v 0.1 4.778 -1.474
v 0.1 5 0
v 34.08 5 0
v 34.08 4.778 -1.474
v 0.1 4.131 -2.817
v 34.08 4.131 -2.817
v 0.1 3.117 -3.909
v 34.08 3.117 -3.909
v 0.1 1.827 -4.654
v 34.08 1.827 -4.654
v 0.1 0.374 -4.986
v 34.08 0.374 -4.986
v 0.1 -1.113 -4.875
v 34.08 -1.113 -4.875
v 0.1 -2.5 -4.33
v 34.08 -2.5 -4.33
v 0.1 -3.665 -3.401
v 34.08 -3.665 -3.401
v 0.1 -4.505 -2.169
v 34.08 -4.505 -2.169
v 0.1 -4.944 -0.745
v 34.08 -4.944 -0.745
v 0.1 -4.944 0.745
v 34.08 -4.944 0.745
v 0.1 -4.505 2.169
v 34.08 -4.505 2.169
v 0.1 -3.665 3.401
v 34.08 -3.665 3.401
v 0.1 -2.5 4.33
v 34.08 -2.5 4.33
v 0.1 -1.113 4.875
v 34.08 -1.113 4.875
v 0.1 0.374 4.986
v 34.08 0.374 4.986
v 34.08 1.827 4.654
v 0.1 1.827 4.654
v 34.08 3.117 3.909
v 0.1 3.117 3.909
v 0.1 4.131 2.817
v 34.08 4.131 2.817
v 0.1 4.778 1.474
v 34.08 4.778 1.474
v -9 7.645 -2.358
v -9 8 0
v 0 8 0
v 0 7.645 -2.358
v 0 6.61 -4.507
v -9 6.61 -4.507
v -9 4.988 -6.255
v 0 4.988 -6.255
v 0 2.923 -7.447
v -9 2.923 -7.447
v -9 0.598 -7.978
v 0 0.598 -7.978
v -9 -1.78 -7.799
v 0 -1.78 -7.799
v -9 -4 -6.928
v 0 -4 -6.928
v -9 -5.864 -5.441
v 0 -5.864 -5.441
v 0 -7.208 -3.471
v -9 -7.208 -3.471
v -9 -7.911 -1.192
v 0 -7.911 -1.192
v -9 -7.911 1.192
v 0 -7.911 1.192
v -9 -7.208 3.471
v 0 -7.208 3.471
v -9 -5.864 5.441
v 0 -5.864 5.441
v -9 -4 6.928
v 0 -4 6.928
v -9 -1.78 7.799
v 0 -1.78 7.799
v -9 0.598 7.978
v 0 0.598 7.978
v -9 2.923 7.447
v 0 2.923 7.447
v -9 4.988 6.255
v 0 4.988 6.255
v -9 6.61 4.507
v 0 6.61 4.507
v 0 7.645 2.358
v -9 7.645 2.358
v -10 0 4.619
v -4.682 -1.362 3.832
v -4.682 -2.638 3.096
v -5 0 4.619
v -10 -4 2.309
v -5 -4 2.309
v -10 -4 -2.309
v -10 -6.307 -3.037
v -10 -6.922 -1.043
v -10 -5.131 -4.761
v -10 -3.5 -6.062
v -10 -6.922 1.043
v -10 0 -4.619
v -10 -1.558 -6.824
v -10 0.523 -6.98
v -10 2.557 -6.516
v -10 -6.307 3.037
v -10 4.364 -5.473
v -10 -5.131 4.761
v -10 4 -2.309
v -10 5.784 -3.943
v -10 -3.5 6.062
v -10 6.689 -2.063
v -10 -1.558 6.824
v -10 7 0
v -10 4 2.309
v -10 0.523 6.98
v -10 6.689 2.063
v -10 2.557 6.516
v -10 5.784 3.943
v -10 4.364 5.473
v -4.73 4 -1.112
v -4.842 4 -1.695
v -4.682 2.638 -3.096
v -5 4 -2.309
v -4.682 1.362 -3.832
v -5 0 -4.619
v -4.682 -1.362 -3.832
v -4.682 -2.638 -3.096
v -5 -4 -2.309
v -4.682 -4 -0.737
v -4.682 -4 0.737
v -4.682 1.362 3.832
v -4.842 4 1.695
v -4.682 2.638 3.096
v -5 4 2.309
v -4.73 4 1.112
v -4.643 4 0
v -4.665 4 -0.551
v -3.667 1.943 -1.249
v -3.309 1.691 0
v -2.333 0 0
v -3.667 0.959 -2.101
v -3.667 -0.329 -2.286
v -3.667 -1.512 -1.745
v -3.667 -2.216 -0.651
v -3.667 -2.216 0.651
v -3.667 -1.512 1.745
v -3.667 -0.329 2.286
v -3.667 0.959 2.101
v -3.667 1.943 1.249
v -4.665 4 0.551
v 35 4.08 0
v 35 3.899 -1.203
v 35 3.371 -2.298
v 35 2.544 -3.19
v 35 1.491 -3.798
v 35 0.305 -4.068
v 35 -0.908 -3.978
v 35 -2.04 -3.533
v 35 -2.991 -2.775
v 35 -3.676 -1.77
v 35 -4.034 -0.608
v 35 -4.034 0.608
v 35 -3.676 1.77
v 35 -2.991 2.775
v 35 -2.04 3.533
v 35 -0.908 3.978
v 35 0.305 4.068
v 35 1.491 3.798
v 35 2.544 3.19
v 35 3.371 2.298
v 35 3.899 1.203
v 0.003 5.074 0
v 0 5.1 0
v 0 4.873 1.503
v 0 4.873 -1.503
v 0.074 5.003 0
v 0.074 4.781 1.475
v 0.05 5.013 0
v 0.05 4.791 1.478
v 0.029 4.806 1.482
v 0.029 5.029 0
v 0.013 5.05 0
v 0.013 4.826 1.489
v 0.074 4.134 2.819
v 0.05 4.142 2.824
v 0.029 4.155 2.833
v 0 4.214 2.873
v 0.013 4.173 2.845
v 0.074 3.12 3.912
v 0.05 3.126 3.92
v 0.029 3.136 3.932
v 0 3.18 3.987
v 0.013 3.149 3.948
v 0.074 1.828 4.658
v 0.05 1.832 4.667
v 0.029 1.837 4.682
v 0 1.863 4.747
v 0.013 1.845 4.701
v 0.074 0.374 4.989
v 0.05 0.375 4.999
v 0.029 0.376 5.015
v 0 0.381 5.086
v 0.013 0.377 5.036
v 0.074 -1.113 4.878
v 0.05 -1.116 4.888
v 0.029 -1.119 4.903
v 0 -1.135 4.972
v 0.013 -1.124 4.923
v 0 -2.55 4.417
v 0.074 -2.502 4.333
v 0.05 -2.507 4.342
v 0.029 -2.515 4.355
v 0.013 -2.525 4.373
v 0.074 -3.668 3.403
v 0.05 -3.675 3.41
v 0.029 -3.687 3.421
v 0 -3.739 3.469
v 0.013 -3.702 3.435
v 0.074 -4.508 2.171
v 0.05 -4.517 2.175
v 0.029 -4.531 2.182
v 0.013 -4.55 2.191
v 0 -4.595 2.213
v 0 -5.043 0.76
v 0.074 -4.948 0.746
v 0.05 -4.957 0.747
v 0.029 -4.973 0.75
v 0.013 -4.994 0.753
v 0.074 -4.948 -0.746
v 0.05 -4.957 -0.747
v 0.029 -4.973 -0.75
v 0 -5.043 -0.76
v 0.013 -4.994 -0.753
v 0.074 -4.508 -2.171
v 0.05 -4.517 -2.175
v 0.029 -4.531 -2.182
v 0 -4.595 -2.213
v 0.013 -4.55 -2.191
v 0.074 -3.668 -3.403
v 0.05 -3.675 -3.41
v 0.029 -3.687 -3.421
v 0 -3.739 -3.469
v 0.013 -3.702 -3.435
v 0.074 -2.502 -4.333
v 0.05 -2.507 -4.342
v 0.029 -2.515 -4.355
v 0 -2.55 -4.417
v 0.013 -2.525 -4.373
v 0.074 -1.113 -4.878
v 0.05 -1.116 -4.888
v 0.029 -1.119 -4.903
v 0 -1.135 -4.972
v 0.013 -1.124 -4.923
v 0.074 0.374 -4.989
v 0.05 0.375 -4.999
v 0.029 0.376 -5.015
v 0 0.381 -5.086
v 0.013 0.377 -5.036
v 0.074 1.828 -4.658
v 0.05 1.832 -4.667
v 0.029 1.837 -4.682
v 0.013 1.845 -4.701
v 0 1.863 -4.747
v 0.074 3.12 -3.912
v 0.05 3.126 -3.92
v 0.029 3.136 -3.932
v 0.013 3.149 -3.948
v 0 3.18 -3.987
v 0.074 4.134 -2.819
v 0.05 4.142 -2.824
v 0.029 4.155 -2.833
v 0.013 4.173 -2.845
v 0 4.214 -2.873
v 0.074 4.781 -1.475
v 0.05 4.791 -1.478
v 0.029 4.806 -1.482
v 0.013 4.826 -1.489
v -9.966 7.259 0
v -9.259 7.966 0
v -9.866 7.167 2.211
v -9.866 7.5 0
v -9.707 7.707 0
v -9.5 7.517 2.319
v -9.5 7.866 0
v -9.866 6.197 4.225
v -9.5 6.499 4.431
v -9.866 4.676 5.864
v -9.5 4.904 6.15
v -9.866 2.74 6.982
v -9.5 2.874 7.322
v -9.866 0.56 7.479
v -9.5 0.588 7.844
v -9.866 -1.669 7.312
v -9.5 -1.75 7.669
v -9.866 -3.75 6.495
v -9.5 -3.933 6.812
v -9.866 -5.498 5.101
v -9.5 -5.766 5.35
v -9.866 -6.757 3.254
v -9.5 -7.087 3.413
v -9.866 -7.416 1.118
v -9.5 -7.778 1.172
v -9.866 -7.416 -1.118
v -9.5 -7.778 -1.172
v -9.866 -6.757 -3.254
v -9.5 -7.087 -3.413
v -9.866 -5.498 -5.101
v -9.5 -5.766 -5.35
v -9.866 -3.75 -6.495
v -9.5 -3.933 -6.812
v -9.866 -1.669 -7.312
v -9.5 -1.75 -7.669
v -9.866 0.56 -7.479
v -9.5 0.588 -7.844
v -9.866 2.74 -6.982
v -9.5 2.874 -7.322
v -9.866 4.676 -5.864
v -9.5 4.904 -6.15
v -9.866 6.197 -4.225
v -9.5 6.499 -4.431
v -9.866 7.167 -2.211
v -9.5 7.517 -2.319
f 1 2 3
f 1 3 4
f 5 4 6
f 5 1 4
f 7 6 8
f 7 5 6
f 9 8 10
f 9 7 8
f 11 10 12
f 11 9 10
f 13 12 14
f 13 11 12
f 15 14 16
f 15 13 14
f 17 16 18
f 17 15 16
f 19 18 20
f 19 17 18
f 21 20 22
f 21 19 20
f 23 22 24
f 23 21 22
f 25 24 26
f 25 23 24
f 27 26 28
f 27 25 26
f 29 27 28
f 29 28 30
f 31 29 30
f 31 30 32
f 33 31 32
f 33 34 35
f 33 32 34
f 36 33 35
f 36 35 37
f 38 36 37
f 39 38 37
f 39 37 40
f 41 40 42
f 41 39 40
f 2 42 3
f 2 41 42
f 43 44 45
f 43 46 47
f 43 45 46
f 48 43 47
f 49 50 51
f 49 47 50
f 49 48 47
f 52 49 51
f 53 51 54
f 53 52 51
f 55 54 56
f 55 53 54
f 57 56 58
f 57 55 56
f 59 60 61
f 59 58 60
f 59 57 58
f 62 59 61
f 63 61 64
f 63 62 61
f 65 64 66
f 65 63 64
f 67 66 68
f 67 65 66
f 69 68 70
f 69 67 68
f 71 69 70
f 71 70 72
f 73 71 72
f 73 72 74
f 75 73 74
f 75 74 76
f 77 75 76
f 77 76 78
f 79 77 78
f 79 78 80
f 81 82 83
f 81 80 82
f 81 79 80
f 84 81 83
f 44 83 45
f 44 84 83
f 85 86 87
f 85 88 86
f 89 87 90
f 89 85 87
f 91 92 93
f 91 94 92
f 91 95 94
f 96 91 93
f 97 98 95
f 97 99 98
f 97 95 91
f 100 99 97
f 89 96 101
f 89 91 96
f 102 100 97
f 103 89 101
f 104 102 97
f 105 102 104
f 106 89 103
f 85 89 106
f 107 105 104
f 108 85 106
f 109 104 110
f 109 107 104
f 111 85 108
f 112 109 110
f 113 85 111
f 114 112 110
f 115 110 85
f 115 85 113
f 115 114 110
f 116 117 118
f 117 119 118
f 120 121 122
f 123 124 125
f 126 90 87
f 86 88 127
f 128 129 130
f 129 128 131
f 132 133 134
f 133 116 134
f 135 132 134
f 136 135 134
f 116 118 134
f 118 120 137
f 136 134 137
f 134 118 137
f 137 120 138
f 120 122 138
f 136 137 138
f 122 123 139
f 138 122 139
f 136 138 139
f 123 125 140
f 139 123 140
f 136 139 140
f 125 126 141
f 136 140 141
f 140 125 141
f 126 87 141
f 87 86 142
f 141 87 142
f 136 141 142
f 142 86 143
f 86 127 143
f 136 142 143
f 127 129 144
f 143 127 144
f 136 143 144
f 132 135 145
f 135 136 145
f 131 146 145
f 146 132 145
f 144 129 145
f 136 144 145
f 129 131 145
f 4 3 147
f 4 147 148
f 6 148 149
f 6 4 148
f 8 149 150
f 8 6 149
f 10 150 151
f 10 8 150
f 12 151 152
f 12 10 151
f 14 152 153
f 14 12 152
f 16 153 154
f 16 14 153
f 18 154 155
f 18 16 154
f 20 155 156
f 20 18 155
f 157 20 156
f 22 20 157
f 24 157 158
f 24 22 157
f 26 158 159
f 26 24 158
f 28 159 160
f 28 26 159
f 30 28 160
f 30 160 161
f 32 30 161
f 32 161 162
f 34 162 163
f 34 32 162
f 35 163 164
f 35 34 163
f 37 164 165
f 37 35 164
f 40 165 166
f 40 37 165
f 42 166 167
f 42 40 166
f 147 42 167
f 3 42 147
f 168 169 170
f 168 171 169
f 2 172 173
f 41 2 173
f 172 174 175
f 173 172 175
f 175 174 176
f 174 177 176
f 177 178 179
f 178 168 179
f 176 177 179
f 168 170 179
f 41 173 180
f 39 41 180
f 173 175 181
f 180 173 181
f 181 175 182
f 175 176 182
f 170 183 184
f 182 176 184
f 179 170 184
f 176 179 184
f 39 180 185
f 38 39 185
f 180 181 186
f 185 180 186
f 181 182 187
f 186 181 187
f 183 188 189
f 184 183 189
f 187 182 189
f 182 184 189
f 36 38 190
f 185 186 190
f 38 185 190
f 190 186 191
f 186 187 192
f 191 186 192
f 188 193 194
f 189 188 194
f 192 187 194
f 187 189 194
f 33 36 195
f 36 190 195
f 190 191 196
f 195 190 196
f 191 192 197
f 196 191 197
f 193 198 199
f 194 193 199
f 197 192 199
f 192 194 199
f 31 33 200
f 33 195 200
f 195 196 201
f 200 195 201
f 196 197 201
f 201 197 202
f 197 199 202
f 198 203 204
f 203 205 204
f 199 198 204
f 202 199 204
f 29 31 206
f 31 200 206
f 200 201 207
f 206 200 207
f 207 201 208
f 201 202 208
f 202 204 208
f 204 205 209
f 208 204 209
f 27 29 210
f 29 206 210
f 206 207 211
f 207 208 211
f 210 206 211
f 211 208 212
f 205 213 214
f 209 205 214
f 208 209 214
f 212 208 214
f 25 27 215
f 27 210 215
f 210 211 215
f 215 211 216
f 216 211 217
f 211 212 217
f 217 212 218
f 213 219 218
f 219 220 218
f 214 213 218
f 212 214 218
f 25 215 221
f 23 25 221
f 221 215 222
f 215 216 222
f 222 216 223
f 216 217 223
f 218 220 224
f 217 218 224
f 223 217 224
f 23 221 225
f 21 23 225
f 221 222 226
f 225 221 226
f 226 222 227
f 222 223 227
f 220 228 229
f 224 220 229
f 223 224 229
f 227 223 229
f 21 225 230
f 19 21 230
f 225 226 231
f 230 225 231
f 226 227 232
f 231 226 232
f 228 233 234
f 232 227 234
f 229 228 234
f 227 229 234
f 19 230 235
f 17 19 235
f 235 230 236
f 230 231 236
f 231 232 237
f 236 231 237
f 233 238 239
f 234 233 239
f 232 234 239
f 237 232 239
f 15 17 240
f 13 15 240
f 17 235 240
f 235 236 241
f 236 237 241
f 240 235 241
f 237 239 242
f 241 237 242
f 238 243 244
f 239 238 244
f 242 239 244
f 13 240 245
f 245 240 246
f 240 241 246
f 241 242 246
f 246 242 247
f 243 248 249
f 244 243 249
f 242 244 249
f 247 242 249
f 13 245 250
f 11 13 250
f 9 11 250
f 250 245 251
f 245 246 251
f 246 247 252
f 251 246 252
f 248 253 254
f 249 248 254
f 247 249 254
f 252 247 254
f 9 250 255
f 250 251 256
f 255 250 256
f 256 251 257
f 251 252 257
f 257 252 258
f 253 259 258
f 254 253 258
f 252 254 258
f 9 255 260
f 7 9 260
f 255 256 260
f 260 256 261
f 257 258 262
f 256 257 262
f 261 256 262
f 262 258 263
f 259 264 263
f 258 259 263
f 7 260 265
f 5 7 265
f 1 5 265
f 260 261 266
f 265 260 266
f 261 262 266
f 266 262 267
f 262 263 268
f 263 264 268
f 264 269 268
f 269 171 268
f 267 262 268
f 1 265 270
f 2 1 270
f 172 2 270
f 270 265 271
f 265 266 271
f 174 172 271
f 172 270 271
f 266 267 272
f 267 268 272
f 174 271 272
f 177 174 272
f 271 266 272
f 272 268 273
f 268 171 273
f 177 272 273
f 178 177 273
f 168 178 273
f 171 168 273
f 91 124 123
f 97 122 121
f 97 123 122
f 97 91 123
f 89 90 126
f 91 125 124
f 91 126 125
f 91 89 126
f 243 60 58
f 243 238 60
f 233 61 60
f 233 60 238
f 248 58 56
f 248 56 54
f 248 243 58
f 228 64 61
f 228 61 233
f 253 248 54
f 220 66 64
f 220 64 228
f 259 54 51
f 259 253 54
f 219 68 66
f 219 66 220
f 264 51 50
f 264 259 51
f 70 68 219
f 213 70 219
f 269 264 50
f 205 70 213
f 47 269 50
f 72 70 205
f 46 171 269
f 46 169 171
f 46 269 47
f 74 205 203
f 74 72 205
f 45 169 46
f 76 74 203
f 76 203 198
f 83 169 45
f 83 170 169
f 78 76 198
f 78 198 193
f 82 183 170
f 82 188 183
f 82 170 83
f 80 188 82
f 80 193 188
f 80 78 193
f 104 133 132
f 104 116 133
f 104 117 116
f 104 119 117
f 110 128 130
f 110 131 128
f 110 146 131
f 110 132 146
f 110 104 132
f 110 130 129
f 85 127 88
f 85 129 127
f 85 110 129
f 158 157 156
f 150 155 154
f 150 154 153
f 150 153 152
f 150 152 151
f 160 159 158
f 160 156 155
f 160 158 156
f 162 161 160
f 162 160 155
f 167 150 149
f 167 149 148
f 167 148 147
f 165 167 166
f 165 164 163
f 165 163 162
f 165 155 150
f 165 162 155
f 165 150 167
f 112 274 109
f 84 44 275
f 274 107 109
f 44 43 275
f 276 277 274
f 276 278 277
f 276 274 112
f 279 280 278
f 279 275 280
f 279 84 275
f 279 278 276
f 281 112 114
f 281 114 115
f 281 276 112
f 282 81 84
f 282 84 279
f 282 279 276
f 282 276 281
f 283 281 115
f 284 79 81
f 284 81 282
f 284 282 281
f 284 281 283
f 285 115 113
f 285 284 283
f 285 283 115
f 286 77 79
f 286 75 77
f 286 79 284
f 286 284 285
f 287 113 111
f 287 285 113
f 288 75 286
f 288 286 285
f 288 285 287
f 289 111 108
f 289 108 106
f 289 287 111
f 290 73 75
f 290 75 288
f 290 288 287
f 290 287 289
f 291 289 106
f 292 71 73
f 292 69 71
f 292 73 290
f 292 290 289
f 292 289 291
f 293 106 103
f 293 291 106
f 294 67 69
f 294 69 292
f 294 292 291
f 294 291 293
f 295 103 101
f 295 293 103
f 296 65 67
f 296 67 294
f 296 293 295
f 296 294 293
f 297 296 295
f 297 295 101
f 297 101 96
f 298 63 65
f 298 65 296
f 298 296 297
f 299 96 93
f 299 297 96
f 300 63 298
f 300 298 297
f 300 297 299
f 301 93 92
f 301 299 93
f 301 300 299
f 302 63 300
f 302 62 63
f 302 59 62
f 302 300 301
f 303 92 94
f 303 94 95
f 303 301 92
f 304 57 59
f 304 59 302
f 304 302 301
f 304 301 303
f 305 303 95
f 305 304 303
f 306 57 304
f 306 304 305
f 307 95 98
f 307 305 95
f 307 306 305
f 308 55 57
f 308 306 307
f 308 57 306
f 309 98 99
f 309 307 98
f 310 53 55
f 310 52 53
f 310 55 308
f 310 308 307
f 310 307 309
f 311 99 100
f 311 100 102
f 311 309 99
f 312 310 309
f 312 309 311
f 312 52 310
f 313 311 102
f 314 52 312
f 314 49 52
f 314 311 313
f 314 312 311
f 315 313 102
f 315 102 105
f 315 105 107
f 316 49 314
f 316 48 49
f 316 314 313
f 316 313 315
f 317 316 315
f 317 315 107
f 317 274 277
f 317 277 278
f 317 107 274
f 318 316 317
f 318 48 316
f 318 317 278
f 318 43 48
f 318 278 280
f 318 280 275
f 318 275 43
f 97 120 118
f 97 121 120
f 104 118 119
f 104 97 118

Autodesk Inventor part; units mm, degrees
ref_plane "YZ Plane" through (0, 0, 0) normal (1, 0, 0) x (0, 1, 0)
ref_plane "XZ Plane" through (0, 0, 0) normal (0, 1, 0) x (-1, 0, 0)
sketch "Sketch1" plane through (0, 0, 0) normal (0, 0, 1) x (1, 0, 0)
  line L0 (-2.3333, 0) -> (35, 0)
  line L1 (35, 0) -> (35, 5)
  line L2 (35, 5) -> (3.75, 5)
  line L3 (3.75, 5) -> (2.8297, 5)
  line L4 (2.8297, 5) -> (0, 5)
  line L5 (0, 5) -> (0, 8)
  line L6 (0, 8) -> (-10, 8)
  line L7 (-10, 8) -> (-10, 4.6188)
  line L8 (-10, 4.6188) -> (-5, 4.6188)
  line L9 (-5, 4.6188) -> (-2.3333, 0)
  line L10 (-19, 0) -> (44, 0) projected
  line L11 (0, -1.6) -> (0, 9.6) projected
  line L12 (3.75, 5) -> (0, 5) construction
  dimension "d1" = 31.25
  dimension "d2" = 0.9203
  dimension "d3" = 10
  dimension "d4" = 5
  dimension "d5" = 60
  dimension "d6" = 10
  dimension "d7" = 10
  dimension "d8" = 9.2376
  dimension "d9" = 16
  dimension "d26" = 35
revolve "Body" add sketch "Sketch1" angle 360 about axis through (-2.3333, 0, 0) along (1, 0, 0)
sketch "Sketch2" plane through (-10, 0, 0) normal (-1, 0, 0) x (0, 0, 1)
  circle A0 centre (0, 0) radius 4.6188 projected
  line L0 (0, -11.2) -> (0, 11.2) projected
  line L1 (-11.2, 0) -> (11.2, 0) projected
  line L2 (4.6188, 0) -> (2.3094, -4)
  line L3 (2.3094, -4) -> (-2.3094, -4)
  line L4 (-2.3094, -4) -> (-4.6188, 0)
  line L5 (-4.6188, 0) -> (-2.3094, 4)
  line L6 (-2.3094, 4) -> (2.3094, 4)
  line L7 (2.3094, 4) -> (4.6188, 0)
extrude "Slot" add sketch "Sketch2" against normal up to next contours L7 A0 | A0 L2 | L6 L0 A0 | A0 L0 L3 | L0 L6 A0 | A0 L3 L0 | L4 A0 | A0 L5
fillet "Fillet1" radius 1 1 edges at (-10, -8, 0)
thread "Thread" size "M10x1.5" class "6g" standard "ISO Metric profile" length 31.25
chamfer "Chamfer1" distance 0.9202 distance2 0.9202 1 edges at (35, -5, 0) measured on face at (35, 1.974, -0.2121)
ref_plane "Work Plane1" through (29, 0, 0) normal (0, -1, 0) x (1, 0, 0)
fillet "Fillet2" radius 0.1 1 edges at (0, -5, 0)
equation "\"d1\" = GEL"
equation "\"d3\" = KOH"
equation "\"d4\" = INTI"
equation "\"d6\" = GD"
equation "\"d7\" = BDM"
equation "\"d8\" = 1.1547 * SW"
equation "\"d9\" = KOD"
equation "\"d26\" = NLG"
equation "\"d30\" = R"
equation "\"d17\" = RR"
equation "\"d13\" = GEL"
equation "\"d15\" = -0.5 * SPD + 0.5 * GD"
equation "\"d16\" = GUL"
equation "\"GD\" = NND"
equation "\"NLG\" = 35"
equation "\"GEL\" = 31.25"
equation "\"KOD\" = 16"
equation "\"KOH\" = NND"
equation "\"INTI\" = 5"
equation "\"GAL\" = 0.61345 * PTC"
equation "\"GUL\" = 0.61345 * PTC"
equation "\"BDM\" = NND"
equation "\"SW\" = 8"
equation "\"RR\" = 0.1 * NND"
equation "\"SPD\" = NND - 1.2269 * PTC"
equation "\"R\" = 0.1"
equation "\"TOA\" = 30deg"
equation "\"GD1\" = THREADDIA - 1.2269 * PTC"
equation "\"FAWI\" = 45deg"
equation "\"PTC\" = 1.5"
equation "\"E0\" = 1.155 * SW"
equation "\"NND\" = 10"
equation "\"THREADDIA\" = 10"
properties part number "M10x45 SHCS A2" material "Stainless Steel AISI 304"
